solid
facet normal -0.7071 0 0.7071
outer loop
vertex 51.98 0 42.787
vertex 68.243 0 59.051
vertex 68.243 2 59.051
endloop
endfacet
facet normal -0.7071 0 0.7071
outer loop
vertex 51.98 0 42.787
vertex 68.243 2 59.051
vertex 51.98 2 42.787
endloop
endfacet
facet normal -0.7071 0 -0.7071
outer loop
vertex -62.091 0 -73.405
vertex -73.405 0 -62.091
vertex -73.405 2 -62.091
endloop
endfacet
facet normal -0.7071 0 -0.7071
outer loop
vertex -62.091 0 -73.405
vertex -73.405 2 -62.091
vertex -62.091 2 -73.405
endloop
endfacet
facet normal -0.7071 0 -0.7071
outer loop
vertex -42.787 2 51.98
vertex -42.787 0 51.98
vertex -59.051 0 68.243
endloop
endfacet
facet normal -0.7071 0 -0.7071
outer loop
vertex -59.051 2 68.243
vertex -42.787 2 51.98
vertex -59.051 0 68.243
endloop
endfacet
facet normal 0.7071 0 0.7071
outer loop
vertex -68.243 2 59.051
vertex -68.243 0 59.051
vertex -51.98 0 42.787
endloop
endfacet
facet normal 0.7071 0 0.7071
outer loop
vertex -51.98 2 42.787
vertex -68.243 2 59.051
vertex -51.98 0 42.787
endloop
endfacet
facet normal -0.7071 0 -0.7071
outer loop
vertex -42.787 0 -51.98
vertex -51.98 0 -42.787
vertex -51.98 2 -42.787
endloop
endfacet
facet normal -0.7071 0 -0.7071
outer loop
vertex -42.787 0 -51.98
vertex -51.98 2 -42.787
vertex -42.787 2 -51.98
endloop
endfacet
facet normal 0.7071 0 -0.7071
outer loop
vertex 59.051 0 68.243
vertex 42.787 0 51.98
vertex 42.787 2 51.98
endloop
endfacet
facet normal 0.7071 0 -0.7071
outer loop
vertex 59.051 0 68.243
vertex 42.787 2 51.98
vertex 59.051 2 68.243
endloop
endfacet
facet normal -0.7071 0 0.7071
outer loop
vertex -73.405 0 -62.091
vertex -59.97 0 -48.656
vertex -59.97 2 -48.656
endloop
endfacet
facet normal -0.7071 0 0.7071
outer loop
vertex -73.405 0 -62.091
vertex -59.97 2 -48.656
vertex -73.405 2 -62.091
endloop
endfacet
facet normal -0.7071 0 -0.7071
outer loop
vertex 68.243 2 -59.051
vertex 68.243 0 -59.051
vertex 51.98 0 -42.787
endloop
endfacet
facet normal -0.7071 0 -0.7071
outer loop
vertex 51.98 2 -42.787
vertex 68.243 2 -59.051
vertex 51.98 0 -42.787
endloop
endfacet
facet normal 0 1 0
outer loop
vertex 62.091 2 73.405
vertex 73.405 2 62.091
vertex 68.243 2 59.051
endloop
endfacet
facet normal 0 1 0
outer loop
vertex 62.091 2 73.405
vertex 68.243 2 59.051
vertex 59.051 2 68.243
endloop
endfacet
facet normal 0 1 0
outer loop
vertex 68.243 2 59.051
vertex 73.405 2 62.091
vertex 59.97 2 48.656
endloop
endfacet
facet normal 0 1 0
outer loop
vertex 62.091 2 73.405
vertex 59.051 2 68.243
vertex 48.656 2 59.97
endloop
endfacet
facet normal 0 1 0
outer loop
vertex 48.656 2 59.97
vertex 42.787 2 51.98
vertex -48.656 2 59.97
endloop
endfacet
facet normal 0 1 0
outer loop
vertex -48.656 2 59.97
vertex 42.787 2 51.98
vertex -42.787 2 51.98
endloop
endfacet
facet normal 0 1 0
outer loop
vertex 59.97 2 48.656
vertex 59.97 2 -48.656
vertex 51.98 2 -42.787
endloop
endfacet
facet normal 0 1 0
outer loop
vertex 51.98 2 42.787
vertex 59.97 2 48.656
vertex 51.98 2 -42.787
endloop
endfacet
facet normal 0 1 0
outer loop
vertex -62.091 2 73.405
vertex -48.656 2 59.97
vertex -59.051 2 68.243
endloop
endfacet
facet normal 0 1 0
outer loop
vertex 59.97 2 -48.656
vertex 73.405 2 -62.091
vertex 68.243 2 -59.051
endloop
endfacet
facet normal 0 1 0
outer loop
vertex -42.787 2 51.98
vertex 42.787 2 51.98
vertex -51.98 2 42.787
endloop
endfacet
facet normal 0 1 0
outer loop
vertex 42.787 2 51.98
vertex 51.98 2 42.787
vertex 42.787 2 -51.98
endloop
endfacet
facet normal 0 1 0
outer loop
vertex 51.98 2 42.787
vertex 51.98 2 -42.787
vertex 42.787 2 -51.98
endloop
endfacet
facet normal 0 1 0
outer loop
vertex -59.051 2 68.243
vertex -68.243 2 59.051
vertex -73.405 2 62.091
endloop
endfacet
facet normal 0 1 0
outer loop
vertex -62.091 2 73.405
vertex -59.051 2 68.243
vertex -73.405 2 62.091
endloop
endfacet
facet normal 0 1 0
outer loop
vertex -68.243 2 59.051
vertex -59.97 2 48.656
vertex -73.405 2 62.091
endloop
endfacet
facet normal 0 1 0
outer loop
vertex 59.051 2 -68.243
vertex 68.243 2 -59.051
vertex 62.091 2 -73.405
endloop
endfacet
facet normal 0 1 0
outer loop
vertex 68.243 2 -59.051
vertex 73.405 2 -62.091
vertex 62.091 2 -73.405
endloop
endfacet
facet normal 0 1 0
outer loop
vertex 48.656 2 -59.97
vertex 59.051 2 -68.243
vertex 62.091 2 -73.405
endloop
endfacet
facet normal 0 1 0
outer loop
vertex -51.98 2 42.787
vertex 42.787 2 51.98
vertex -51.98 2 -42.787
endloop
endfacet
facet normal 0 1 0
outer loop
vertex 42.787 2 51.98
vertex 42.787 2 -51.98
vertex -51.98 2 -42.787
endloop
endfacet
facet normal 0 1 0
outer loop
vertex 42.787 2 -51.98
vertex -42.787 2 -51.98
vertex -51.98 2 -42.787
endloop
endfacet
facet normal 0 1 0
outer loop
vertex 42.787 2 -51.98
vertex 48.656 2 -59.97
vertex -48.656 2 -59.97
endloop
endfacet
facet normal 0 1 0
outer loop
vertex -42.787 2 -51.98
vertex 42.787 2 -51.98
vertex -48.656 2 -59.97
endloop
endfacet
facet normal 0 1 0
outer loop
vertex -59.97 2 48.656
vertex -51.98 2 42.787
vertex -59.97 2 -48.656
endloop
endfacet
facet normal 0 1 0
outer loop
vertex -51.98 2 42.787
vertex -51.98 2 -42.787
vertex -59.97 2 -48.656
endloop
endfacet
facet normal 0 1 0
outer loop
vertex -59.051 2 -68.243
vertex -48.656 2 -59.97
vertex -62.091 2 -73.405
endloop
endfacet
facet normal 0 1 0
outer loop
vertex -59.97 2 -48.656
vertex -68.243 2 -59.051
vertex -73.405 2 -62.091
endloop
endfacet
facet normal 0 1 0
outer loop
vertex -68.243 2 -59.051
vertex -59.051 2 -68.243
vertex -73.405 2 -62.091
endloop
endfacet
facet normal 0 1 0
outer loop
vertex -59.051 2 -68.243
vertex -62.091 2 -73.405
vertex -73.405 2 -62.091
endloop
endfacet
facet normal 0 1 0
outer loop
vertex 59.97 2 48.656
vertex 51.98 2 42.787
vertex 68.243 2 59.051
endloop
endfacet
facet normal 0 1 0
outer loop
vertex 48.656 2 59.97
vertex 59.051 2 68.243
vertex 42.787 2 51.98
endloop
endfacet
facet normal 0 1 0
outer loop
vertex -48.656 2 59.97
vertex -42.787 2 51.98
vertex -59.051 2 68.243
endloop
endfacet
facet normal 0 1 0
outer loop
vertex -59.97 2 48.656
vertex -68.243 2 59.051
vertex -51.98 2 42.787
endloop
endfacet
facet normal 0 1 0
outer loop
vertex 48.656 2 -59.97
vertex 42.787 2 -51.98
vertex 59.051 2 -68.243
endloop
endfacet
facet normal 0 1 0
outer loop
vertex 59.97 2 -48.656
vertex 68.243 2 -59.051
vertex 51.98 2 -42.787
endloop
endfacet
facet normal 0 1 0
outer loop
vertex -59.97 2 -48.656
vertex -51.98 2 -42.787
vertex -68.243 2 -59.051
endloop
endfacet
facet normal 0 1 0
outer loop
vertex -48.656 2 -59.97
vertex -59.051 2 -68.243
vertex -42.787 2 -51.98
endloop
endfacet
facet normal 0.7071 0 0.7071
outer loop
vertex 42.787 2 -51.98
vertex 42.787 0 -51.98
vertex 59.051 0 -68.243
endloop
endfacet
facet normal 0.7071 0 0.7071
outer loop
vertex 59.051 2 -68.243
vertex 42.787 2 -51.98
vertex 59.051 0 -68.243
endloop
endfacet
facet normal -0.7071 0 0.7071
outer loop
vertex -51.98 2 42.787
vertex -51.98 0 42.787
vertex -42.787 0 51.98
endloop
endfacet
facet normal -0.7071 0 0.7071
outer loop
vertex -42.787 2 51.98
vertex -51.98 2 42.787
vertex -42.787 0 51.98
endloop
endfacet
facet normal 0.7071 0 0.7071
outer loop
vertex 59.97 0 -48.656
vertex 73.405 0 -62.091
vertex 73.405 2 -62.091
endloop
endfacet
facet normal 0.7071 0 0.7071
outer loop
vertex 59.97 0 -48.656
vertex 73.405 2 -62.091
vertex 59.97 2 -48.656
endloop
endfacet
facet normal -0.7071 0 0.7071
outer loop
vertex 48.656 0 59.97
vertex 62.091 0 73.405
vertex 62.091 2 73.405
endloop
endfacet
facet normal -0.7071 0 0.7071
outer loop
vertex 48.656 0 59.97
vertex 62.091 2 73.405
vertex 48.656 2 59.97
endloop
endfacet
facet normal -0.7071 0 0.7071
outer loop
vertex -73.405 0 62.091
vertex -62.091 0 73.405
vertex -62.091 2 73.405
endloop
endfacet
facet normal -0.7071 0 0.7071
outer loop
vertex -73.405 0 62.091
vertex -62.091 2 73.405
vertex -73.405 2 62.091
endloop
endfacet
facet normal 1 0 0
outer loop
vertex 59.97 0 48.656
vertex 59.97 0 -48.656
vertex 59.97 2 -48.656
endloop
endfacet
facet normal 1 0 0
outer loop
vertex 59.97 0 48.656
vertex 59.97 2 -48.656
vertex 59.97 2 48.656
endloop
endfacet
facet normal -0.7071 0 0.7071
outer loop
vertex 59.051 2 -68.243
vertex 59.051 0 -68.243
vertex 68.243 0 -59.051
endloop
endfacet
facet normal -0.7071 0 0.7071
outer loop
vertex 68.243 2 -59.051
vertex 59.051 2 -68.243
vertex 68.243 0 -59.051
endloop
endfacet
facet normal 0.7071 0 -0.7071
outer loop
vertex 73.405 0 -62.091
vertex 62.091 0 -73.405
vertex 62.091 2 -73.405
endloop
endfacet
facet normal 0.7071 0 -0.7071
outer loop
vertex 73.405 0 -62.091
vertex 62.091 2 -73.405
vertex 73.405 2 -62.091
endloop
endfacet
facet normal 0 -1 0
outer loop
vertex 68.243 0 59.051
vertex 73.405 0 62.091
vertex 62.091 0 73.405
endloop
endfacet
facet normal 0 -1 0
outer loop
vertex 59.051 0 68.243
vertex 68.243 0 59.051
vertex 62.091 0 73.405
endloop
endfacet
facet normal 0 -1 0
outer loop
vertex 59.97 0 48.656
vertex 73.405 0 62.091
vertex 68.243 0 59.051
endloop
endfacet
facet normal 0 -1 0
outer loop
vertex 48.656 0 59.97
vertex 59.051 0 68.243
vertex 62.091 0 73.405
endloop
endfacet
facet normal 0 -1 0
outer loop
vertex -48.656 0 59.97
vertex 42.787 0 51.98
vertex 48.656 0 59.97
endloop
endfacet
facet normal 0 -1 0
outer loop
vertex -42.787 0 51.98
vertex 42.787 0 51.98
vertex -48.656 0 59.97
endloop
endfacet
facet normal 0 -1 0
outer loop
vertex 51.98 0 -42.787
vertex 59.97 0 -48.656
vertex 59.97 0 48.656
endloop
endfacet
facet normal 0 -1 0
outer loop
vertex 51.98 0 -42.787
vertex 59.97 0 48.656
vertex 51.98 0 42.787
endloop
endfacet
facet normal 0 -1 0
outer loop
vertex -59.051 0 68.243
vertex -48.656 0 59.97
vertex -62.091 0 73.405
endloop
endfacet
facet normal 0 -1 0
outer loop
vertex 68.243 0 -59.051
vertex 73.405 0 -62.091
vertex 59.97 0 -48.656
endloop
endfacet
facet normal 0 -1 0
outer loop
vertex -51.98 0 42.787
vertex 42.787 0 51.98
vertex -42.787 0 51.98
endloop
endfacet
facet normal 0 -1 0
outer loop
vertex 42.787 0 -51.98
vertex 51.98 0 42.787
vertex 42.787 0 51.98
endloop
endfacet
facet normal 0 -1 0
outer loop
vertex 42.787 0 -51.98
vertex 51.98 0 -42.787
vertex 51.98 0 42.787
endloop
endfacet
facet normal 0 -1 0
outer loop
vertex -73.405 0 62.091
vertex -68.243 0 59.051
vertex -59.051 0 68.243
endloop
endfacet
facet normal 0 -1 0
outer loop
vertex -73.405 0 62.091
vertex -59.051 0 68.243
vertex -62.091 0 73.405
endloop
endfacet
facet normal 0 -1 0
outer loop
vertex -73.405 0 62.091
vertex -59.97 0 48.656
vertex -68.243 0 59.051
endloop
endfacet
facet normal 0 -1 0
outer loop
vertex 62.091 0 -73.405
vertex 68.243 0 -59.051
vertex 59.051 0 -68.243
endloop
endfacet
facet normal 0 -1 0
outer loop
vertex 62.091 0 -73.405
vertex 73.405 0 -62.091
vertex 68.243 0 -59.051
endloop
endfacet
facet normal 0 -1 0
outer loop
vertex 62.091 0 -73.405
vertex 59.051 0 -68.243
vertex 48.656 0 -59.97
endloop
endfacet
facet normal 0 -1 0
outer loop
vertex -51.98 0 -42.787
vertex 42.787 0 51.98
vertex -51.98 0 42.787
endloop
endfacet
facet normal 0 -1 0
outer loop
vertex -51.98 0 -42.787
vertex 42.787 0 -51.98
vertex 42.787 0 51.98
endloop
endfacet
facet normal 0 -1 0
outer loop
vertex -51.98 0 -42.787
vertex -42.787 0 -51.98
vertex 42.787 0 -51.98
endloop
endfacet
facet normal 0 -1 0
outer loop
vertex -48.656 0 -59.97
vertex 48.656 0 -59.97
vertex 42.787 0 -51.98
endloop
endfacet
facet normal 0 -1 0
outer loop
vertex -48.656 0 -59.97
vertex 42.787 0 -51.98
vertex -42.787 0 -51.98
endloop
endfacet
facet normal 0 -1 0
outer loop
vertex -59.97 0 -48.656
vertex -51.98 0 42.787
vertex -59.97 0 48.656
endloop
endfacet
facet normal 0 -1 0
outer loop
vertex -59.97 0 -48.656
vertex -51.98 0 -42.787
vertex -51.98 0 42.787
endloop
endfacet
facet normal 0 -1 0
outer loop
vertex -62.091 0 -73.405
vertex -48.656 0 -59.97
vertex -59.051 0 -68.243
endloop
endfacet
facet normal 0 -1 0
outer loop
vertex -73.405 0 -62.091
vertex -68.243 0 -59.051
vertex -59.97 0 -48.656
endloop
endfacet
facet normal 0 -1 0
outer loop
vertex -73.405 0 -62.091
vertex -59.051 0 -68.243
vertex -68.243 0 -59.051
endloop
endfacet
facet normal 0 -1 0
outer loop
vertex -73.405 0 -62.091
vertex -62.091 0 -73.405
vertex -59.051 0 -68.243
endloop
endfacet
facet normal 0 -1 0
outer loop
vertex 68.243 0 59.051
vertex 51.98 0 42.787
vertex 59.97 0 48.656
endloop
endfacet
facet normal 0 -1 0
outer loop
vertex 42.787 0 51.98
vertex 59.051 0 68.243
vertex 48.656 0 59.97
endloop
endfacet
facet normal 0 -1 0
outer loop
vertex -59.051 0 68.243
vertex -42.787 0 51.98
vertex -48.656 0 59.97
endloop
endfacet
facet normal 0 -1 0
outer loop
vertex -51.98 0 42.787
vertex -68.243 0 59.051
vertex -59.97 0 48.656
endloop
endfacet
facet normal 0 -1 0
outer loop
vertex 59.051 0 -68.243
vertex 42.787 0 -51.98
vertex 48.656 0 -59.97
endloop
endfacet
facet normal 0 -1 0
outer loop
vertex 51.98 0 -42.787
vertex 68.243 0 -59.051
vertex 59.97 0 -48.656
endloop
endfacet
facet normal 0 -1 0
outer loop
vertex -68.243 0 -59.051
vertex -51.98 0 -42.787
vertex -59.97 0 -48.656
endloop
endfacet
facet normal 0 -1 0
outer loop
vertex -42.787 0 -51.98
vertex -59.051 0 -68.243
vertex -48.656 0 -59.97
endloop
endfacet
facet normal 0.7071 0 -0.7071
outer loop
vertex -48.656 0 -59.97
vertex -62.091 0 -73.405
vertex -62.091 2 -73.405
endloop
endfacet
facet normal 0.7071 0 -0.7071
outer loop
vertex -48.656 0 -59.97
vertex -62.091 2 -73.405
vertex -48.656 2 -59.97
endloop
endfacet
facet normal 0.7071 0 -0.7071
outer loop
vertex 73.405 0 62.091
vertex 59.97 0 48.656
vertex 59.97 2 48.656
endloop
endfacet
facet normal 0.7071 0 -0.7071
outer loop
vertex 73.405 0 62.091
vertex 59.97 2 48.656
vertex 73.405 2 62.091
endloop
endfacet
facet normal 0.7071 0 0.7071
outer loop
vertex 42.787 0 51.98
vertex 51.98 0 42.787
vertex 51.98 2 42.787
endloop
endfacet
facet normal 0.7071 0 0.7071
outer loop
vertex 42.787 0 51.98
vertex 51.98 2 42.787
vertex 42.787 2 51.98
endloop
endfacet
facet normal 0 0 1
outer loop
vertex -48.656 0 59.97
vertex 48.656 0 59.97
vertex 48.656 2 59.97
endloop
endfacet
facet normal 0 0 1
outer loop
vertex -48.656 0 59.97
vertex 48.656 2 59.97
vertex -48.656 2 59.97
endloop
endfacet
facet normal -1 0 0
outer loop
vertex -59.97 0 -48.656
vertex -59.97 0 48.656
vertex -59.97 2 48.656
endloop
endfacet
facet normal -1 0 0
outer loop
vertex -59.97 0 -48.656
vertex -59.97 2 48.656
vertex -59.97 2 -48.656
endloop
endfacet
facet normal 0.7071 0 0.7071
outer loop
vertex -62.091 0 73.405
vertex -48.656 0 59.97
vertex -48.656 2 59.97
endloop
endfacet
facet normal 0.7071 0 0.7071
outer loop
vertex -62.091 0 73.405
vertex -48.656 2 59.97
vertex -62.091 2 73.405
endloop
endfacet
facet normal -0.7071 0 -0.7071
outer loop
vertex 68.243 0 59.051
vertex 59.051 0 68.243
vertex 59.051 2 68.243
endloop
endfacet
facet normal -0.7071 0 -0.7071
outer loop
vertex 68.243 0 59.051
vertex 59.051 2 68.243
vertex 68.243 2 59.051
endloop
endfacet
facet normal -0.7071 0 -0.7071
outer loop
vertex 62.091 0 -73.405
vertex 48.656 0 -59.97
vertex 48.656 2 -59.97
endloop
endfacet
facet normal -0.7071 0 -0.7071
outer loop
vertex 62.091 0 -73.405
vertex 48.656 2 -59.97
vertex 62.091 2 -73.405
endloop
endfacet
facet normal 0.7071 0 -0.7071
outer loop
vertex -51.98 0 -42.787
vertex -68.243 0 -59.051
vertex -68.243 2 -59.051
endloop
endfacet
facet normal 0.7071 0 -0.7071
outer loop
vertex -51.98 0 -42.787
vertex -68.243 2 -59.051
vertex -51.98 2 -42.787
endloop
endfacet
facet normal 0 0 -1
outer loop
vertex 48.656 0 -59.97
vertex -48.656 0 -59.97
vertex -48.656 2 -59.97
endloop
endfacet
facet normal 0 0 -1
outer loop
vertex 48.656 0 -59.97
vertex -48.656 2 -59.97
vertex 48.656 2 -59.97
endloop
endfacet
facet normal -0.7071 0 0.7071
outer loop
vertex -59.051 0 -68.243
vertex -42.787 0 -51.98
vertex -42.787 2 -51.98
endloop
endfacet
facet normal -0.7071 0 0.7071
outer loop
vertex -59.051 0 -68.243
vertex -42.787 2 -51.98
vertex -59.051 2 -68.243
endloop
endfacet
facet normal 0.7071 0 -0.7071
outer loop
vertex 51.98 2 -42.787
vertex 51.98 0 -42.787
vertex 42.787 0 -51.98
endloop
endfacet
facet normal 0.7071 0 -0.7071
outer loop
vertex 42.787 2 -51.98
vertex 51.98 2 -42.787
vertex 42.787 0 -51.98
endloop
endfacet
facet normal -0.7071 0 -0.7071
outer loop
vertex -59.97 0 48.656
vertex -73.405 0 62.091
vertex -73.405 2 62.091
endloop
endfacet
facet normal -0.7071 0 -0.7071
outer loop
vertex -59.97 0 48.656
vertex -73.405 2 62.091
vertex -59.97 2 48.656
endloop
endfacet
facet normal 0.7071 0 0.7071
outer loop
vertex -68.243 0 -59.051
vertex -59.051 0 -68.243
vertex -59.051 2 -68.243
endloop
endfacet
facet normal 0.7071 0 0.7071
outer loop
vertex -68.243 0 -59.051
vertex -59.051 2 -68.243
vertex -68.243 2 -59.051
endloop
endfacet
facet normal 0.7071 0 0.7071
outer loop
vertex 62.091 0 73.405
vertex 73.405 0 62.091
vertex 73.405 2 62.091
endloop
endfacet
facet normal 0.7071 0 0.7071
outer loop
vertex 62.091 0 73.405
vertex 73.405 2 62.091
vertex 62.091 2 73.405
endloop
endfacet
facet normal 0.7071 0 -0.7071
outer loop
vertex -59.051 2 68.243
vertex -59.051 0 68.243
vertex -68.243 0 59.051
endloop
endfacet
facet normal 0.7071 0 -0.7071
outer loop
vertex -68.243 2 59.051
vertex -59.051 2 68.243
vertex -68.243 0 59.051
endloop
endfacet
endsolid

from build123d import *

# Parameters (mm, degrees)
BOSS_EXTRUDE1_DEPTH = 2


with BuildPart() as part:
    # Sketch1 → Boss-Extrude1 (new body)
    with BuildSketch(Plane(origin=(0, 0, 0), x_dir=(1, 0, 0), z_dir=(0, 1, 0))):
        Polygon((48.656170244, -59.969878742), (-48.656170244, -59.969878742), (-62.091199086, -73.404907585), (-73.404907585, -62.091199086), (-59.969878742, -48.656170244), (-59.969878742, 48.656170244), (-73.404907585, 62.091199086), (-62.091199086, 73.404907585), (-48.656170244, 59.969878742), (48.656170244, 59.969878742), (62.091199086, 73.404907585), (73.404907585, 62.091199086), (59.969878742, 48.656170244), (59.969878742, -48.656170244), (73.404907585, -62.091199086), (62.091199086, -73.404907585), align=None)
        Polygon((59.050639927, 68.243028082), (68.243028082, 59.050639927), (51.979572115, 42.78718396), (42.78718396, 51.979572115), align=None, mode=Mode.SUBTRACT)
        Polygon((68.243028082, -59.050639927), (51.979572115, -42.78718396), (42.78718396, -51.979572115), (59.050639927, -68.243028082), align=None, mode=Mode.SUBTRACT)
        Polygon((-59.050639927, -68.243028082), (-68.243028082, -59.050639927), (-51.979572115, -42.78718396), (-42.78718396, -51.979572115), align=None, mode=Mode.SUBTRACT)
        Polygon((-68.243028082, 59.050639927), (-51.979572115, 42.78718396), (-42.78718396, 51.979572115), (-59.050639927, 68.243028082), align=None, mode=Mode.SUBTRACT)
    extrude(amount=BOSS_EXTRUDE1_DEPTH)


solid = part.part
